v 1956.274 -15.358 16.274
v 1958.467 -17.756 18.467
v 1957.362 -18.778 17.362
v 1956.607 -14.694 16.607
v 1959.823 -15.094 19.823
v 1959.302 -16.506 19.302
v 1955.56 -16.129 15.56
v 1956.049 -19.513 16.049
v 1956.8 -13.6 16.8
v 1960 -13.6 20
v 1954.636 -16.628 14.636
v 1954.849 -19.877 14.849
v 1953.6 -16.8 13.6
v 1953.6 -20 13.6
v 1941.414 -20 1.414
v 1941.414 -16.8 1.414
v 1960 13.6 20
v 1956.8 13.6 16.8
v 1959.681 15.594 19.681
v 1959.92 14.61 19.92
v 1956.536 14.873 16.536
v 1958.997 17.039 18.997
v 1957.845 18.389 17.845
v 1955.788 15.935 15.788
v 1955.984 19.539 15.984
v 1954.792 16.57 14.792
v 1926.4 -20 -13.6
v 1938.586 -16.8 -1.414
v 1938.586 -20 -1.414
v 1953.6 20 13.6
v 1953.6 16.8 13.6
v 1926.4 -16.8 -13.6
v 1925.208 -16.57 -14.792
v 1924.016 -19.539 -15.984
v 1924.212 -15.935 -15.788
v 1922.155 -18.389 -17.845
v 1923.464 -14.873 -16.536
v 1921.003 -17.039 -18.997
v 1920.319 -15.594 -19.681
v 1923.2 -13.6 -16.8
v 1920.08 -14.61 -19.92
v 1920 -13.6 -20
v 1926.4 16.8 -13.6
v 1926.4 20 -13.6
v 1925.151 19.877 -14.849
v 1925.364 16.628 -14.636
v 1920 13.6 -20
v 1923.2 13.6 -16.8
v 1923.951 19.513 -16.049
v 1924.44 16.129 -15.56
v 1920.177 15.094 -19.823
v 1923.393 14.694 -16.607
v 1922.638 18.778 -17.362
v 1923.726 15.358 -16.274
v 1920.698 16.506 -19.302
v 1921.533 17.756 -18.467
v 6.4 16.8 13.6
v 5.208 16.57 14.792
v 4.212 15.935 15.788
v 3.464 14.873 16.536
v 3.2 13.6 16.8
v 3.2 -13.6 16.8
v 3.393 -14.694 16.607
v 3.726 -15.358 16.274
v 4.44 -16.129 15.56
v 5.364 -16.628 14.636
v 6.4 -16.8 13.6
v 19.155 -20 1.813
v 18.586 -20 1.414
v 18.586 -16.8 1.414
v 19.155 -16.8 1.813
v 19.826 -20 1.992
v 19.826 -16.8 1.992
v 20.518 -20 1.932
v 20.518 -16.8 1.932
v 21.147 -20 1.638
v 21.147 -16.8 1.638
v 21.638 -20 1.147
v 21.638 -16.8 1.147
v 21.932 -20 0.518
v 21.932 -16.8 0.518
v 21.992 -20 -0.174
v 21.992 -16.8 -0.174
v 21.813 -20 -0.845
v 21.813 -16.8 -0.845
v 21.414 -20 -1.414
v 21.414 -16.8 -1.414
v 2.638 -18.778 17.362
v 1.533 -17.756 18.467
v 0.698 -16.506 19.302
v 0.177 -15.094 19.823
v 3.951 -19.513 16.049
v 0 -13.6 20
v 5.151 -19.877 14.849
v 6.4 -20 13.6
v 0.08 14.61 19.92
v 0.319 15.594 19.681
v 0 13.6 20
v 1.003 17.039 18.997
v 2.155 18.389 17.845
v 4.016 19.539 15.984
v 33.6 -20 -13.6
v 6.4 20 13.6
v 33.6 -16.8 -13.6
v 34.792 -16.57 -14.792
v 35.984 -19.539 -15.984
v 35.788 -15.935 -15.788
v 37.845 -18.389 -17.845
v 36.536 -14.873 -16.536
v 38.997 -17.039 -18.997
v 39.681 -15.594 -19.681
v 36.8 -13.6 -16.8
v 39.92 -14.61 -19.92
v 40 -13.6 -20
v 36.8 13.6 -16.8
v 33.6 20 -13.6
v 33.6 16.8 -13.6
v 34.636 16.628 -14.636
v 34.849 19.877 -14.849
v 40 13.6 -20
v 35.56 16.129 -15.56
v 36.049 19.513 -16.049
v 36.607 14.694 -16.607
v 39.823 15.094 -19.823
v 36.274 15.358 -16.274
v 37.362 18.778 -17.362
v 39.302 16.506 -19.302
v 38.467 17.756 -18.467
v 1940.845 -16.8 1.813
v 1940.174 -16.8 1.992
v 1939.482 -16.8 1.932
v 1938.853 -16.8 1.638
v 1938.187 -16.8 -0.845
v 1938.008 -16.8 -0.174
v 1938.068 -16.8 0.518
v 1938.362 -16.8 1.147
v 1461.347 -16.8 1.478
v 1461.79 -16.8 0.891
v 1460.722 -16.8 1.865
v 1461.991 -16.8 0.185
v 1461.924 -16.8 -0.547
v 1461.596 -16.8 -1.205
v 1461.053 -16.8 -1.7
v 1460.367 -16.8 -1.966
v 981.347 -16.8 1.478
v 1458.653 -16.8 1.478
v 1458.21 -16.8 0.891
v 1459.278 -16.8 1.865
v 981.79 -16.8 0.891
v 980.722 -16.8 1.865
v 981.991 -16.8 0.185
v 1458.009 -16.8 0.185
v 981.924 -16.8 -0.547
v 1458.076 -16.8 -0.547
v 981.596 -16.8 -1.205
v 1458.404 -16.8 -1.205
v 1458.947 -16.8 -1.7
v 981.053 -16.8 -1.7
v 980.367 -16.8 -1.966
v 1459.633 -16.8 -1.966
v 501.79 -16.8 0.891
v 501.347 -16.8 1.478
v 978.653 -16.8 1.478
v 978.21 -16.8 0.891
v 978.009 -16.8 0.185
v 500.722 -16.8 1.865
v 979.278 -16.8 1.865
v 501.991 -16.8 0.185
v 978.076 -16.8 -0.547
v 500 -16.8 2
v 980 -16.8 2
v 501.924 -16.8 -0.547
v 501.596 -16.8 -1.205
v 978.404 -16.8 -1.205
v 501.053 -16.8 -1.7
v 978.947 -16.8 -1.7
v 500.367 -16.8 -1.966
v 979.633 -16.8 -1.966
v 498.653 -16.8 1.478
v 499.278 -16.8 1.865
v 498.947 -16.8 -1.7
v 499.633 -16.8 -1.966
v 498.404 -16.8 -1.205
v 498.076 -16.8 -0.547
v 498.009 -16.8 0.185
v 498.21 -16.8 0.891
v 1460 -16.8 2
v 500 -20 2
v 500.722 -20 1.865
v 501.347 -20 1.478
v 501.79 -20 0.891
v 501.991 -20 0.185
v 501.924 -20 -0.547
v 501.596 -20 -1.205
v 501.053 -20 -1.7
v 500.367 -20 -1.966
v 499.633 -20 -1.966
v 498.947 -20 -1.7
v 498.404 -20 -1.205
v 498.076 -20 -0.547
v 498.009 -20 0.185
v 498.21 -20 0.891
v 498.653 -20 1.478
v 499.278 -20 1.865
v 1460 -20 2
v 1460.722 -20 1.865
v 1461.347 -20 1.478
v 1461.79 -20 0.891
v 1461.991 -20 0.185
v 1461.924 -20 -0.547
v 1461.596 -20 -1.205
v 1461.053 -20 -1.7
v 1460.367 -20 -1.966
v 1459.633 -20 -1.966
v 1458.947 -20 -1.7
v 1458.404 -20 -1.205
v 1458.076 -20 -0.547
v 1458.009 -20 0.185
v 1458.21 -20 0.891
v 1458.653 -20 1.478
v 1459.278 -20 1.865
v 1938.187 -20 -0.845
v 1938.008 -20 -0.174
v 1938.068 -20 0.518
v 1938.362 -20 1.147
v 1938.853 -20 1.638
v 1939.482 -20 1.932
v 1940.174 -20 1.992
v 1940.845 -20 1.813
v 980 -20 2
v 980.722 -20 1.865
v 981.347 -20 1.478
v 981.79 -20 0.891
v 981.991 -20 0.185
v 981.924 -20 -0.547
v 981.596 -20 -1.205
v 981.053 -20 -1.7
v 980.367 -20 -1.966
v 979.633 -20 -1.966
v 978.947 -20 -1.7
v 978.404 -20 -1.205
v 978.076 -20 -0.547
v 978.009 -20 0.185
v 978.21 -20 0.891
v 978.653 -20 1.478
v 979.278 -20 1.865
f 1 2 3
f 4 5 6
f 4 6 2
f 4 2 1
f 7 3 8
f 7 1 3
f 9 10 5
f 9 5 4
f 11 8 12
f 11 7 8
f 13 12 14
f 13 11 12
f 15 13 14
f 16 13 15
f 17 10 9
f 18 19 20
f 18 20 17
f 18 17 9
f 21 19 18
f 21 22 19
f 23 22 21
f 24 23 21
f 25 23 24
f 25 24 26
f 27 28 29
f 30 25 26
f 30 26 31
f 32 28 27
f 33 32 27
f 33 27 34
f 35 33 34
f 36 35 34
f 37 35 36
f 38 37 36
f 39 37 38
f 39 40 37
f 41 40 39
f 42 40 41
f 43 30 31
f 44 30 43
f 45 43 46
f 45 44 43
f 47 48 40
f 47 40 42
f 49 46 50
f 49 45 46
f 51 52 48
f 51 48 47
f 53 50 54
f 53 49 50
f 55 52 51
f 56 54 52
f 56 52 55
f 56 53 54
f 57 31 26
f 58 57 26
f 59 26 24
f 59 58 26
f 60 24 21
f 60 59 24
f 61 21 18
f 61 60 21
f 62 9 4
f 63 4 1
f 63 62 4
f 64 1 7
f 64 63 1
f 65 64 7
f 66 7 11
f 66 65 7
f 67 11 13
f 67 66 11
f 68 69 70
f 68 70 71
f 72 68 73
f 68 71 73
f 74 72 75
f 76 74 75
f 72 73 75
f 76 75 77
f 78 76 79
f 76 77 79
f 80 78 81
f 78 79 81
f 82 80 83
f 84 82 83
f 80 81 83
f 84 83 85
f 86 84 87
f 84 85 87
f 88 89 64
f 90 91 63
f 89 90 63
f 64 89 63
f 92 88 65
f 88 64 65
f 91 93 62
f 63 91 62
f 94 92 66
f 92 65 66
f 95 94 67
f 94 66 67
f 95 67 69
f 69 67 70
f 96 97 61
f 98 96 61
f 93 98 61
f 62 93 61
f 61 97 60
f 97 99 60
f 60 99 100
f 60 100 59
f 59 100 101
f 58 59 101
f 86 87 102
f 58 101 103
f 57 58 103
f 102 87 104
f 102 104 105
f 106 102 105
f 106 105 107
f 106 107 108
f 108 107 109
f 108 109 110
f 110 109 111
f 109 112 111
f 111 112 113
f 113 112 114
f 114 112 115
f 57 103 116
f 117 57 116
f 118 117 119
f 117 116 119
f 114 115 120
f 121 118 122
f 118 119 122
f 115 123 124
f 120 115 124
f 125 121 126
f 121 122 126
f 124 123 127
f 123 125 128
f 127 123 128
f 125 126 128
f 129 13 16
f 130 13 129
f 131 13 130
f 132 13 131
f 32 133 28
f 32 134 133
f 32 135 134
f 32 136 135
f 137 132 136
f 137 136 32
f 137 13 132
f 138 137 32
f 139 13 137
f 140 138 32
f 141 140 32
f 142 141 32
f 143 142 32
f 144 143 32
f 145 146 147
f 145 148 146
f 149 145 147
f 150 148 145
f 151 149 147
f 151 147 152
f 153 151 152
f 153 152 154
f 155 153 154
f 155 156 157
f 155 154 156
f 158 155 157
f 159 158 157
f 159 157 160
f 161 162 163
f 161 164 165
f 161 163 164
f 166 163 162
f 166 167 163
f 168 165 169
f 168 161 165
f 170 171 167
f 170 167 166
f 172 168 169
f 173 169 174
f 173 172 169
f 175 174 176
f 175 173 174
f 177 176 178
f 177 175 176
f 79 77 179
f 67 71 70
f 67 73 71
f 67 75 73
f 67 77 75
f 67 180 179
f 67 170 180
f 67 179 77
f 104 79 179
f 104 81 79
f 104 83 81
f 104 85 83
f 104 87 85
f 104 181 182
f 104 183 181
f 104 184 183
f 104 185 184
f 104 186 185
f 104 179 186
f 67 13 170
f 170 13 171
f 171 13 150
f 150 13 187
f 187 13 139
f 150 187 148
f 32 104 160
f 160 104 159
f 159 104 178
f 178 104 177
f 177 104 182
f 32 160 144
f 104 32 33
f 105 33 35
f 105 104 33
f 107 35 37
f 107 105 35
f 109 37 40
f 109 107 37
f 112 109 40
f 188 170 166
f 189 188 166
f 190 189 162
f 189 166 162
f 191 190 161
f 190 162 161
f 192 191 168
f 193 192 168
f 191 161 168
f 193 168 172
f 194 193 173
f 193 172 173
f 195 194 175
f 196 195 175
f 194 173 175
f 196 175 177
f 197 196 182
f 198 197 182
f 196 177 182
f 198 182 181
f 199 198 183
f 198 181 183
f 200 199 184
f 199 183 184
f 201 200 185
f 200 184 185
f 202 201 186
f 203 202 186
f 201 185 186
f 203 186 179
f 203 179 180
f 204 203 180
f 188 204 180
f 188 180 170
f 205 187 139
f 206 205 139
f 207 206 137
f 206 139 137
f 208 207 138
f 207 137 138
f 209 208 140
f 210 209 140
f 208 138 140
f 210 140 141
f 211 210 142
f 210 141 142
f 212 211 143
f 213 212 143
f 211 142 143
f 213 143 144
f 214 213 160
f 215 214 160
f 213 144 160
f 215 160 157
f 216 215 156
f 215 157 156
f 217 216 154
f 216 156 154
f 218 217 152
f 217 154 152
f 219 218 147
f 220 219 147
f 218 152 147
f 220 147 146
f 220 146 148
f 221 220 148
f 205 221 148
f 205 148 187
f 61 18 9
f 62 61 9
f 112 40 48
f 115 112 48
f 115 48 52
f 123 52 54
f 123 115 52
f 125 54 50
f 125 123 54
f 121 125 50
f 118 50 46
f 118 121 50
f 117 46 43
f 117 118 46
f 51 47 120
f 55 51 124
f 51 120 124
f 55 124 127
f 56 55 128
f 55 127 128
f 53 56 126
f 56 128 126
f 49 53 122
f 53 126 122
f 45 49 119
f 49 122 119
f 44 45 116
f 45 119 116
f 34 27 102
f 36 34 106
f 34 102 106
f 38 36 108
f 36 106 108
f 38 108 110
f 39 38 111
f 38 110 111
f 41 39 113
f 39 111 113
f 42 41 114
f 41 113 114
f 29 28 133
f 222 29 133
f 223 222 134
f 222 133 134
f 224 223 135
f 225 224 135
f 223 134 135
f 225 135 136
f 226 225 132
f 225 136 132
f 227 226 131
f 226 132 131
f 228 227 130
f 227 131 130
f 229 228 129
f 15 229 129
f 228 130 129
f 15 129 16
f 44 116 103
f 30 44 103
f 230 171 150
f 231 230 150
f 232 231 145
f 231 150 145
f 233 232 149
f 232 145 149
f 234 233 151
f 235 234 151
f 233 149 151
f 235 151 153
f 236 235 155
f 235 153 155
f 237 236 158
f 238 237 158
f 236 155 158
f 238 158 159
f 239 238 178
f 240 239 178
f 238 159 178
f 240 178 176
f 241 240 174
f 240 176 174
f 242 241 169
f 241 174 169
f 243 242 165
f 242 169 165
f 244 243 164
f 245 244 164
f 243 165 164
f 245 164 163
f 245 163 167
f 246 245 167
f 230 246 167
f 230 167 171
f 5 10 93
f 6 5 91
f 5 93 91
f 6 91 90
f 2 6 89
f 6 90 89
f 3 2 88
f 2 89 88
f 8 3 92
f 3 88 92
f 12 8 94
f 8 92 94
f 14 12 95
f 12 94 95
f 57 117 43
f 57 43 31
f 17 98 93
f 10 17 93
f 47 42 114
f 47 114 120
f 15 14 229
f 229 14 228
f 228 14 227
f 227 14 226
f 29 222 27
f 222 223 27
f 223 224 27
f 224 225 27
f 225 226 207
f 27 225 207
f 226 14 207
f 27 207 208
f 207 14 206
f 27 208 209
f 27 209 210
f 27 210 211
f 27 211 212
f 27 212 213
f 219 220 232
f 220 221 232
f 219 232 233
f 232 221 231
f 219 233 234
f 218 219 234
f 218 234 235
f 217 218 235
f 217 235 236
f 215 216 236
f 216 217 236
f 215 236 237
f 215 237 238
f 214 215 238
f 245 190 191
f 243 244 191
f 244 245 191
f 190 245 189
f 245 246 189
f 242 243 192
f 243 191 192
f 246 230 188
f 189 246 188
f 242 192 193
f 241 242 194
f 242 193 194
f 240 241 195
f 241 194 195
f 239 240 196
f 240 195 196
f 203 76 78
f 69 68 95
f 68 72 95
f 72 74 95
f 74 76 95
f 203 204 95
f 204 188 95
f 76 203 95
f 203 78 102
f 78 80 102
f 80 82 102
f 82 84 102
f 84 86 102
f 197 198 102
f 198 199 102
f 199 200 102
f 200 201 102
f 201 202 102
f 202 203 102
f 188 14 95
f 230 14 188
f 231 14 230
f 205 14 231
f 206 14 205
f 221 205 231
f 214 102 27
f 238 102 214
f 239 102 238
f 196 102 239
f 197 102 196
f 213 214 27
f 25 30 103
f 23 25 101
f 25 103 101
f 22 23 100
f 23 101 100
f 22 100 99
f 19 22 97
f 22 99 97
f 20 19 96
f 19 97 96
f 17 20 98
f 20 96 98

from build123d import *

# Parameters (mm, degrees)
TUBE_SQUARE_40_X_40_X_3_2_5_DEPTH = 1960
CUT_EXTRUDE1_DEPTH                = 1961.510137694
SKETCH15_R                        = 2
CUT_EXTRUDE3_DEPTH                = 1961.204071009


with BuildPart() as part:
    # Sketch12 → Tube (square) 40 X 40 X 3.2(5) (new body)
    with BuildSketch(Plane(origin=(0, 0, 0), x_dir=(0, 0, -1), z_dir=(1, 0, 0))):
        with BuildLine():
            Line((-13.6, -20), (13.6, -20))
            ThreePointArc((13.6, -20), (18.1254834, -18.1254834), (20, -13.6))
            Line((20, -13.6), (20, 13.6))
            ThreePointArc((20, 13.6), (18.1254834, 18.1254834), (13.6, 20))
            Line((13.6, 20), (-13.6, 20))
            ThreePointArc((-13.6, 20), (-18.1254834, 18.1254834), (-20, 13.6))
            Line((-20, 13.6), (-20, -13.6))
            ThreePointArc((-20, -13.6), (-18.1254834, -18.1254834), (-13.6, -20))
        make_face()
        with BuildLine():
            Line((-13.6, -16.8), (13.6, -16.8))
            ThreePointArc((13.6, -16.8), (15.8627417, -15.8627417), (16.8, -13.6))
            Line((16.8, -13.6), (16.8, 13.6))
            ThreePointArc((16.8, 13.6), (15.8627417, 15.8627417), (13.6, 16.8))
            Line((13.6, 16.8), (-13.6, 16.8))
            ThreePointArc((-13.6, 16.8), (-15.8627417, 15.8627417), (-16.8, 13.6))
            Line((-16.8, 13.6), (-16.8, -13.6))
            ThreePointArc((-16.8, -13.6), (-15.8627417, -15.8627417), (-13.6, -16.8))
        make_face(mode=Mode.SUBTRACT)
    extrude(amount=TUBE_SQUARE_40_X_40_X_3_2_5_DEPTH)

    # Sketch13 → Cut-Extrude1 (cut, through all)
    with BuildSketch(Plane(origin=(0, 20, 0), x_dir=(1, 0, 0), z_dir=(0, 1, 0))):
        Polygon((1960, 20), (1960, -20), (1920, 20), align=None)
        Polygon((0, 20), (0, -20), (40, 20), align=None)
    extrude(amount=-CUT_EXTRUDE1_DEPTH, mode=Mode.SUBTRACT)

    # Sketch15 → Cut-Extrude3 (cut, through all)
    with BuildSketch(Plane(origin=(0, 0, 0), x_dir=(1, 0, 0), z_dir=(0, 1, 0))):
        with Locations(Location((980, 0, 0), (0, 0, 270))):
            Circle(SKETCH15_R)
        with Locations((20, 0)):
            Circle(SKETCH15_R)
        with Locations((1940, 0)):
            Circle(SKETCH15_R)
        with Locations(Location((500, 0, 0), (0, 0, 270))):
            Circle(SKETCH15_R)
        with Locations(Location((1460, 0, 0), (0, 0, 270))):
            Circle(SKETCH15_R)
    extrude(amount=-CUT_EXTRUDE3_DEPTH, mode=Mode.SUBTRACT)


solid = part.part
